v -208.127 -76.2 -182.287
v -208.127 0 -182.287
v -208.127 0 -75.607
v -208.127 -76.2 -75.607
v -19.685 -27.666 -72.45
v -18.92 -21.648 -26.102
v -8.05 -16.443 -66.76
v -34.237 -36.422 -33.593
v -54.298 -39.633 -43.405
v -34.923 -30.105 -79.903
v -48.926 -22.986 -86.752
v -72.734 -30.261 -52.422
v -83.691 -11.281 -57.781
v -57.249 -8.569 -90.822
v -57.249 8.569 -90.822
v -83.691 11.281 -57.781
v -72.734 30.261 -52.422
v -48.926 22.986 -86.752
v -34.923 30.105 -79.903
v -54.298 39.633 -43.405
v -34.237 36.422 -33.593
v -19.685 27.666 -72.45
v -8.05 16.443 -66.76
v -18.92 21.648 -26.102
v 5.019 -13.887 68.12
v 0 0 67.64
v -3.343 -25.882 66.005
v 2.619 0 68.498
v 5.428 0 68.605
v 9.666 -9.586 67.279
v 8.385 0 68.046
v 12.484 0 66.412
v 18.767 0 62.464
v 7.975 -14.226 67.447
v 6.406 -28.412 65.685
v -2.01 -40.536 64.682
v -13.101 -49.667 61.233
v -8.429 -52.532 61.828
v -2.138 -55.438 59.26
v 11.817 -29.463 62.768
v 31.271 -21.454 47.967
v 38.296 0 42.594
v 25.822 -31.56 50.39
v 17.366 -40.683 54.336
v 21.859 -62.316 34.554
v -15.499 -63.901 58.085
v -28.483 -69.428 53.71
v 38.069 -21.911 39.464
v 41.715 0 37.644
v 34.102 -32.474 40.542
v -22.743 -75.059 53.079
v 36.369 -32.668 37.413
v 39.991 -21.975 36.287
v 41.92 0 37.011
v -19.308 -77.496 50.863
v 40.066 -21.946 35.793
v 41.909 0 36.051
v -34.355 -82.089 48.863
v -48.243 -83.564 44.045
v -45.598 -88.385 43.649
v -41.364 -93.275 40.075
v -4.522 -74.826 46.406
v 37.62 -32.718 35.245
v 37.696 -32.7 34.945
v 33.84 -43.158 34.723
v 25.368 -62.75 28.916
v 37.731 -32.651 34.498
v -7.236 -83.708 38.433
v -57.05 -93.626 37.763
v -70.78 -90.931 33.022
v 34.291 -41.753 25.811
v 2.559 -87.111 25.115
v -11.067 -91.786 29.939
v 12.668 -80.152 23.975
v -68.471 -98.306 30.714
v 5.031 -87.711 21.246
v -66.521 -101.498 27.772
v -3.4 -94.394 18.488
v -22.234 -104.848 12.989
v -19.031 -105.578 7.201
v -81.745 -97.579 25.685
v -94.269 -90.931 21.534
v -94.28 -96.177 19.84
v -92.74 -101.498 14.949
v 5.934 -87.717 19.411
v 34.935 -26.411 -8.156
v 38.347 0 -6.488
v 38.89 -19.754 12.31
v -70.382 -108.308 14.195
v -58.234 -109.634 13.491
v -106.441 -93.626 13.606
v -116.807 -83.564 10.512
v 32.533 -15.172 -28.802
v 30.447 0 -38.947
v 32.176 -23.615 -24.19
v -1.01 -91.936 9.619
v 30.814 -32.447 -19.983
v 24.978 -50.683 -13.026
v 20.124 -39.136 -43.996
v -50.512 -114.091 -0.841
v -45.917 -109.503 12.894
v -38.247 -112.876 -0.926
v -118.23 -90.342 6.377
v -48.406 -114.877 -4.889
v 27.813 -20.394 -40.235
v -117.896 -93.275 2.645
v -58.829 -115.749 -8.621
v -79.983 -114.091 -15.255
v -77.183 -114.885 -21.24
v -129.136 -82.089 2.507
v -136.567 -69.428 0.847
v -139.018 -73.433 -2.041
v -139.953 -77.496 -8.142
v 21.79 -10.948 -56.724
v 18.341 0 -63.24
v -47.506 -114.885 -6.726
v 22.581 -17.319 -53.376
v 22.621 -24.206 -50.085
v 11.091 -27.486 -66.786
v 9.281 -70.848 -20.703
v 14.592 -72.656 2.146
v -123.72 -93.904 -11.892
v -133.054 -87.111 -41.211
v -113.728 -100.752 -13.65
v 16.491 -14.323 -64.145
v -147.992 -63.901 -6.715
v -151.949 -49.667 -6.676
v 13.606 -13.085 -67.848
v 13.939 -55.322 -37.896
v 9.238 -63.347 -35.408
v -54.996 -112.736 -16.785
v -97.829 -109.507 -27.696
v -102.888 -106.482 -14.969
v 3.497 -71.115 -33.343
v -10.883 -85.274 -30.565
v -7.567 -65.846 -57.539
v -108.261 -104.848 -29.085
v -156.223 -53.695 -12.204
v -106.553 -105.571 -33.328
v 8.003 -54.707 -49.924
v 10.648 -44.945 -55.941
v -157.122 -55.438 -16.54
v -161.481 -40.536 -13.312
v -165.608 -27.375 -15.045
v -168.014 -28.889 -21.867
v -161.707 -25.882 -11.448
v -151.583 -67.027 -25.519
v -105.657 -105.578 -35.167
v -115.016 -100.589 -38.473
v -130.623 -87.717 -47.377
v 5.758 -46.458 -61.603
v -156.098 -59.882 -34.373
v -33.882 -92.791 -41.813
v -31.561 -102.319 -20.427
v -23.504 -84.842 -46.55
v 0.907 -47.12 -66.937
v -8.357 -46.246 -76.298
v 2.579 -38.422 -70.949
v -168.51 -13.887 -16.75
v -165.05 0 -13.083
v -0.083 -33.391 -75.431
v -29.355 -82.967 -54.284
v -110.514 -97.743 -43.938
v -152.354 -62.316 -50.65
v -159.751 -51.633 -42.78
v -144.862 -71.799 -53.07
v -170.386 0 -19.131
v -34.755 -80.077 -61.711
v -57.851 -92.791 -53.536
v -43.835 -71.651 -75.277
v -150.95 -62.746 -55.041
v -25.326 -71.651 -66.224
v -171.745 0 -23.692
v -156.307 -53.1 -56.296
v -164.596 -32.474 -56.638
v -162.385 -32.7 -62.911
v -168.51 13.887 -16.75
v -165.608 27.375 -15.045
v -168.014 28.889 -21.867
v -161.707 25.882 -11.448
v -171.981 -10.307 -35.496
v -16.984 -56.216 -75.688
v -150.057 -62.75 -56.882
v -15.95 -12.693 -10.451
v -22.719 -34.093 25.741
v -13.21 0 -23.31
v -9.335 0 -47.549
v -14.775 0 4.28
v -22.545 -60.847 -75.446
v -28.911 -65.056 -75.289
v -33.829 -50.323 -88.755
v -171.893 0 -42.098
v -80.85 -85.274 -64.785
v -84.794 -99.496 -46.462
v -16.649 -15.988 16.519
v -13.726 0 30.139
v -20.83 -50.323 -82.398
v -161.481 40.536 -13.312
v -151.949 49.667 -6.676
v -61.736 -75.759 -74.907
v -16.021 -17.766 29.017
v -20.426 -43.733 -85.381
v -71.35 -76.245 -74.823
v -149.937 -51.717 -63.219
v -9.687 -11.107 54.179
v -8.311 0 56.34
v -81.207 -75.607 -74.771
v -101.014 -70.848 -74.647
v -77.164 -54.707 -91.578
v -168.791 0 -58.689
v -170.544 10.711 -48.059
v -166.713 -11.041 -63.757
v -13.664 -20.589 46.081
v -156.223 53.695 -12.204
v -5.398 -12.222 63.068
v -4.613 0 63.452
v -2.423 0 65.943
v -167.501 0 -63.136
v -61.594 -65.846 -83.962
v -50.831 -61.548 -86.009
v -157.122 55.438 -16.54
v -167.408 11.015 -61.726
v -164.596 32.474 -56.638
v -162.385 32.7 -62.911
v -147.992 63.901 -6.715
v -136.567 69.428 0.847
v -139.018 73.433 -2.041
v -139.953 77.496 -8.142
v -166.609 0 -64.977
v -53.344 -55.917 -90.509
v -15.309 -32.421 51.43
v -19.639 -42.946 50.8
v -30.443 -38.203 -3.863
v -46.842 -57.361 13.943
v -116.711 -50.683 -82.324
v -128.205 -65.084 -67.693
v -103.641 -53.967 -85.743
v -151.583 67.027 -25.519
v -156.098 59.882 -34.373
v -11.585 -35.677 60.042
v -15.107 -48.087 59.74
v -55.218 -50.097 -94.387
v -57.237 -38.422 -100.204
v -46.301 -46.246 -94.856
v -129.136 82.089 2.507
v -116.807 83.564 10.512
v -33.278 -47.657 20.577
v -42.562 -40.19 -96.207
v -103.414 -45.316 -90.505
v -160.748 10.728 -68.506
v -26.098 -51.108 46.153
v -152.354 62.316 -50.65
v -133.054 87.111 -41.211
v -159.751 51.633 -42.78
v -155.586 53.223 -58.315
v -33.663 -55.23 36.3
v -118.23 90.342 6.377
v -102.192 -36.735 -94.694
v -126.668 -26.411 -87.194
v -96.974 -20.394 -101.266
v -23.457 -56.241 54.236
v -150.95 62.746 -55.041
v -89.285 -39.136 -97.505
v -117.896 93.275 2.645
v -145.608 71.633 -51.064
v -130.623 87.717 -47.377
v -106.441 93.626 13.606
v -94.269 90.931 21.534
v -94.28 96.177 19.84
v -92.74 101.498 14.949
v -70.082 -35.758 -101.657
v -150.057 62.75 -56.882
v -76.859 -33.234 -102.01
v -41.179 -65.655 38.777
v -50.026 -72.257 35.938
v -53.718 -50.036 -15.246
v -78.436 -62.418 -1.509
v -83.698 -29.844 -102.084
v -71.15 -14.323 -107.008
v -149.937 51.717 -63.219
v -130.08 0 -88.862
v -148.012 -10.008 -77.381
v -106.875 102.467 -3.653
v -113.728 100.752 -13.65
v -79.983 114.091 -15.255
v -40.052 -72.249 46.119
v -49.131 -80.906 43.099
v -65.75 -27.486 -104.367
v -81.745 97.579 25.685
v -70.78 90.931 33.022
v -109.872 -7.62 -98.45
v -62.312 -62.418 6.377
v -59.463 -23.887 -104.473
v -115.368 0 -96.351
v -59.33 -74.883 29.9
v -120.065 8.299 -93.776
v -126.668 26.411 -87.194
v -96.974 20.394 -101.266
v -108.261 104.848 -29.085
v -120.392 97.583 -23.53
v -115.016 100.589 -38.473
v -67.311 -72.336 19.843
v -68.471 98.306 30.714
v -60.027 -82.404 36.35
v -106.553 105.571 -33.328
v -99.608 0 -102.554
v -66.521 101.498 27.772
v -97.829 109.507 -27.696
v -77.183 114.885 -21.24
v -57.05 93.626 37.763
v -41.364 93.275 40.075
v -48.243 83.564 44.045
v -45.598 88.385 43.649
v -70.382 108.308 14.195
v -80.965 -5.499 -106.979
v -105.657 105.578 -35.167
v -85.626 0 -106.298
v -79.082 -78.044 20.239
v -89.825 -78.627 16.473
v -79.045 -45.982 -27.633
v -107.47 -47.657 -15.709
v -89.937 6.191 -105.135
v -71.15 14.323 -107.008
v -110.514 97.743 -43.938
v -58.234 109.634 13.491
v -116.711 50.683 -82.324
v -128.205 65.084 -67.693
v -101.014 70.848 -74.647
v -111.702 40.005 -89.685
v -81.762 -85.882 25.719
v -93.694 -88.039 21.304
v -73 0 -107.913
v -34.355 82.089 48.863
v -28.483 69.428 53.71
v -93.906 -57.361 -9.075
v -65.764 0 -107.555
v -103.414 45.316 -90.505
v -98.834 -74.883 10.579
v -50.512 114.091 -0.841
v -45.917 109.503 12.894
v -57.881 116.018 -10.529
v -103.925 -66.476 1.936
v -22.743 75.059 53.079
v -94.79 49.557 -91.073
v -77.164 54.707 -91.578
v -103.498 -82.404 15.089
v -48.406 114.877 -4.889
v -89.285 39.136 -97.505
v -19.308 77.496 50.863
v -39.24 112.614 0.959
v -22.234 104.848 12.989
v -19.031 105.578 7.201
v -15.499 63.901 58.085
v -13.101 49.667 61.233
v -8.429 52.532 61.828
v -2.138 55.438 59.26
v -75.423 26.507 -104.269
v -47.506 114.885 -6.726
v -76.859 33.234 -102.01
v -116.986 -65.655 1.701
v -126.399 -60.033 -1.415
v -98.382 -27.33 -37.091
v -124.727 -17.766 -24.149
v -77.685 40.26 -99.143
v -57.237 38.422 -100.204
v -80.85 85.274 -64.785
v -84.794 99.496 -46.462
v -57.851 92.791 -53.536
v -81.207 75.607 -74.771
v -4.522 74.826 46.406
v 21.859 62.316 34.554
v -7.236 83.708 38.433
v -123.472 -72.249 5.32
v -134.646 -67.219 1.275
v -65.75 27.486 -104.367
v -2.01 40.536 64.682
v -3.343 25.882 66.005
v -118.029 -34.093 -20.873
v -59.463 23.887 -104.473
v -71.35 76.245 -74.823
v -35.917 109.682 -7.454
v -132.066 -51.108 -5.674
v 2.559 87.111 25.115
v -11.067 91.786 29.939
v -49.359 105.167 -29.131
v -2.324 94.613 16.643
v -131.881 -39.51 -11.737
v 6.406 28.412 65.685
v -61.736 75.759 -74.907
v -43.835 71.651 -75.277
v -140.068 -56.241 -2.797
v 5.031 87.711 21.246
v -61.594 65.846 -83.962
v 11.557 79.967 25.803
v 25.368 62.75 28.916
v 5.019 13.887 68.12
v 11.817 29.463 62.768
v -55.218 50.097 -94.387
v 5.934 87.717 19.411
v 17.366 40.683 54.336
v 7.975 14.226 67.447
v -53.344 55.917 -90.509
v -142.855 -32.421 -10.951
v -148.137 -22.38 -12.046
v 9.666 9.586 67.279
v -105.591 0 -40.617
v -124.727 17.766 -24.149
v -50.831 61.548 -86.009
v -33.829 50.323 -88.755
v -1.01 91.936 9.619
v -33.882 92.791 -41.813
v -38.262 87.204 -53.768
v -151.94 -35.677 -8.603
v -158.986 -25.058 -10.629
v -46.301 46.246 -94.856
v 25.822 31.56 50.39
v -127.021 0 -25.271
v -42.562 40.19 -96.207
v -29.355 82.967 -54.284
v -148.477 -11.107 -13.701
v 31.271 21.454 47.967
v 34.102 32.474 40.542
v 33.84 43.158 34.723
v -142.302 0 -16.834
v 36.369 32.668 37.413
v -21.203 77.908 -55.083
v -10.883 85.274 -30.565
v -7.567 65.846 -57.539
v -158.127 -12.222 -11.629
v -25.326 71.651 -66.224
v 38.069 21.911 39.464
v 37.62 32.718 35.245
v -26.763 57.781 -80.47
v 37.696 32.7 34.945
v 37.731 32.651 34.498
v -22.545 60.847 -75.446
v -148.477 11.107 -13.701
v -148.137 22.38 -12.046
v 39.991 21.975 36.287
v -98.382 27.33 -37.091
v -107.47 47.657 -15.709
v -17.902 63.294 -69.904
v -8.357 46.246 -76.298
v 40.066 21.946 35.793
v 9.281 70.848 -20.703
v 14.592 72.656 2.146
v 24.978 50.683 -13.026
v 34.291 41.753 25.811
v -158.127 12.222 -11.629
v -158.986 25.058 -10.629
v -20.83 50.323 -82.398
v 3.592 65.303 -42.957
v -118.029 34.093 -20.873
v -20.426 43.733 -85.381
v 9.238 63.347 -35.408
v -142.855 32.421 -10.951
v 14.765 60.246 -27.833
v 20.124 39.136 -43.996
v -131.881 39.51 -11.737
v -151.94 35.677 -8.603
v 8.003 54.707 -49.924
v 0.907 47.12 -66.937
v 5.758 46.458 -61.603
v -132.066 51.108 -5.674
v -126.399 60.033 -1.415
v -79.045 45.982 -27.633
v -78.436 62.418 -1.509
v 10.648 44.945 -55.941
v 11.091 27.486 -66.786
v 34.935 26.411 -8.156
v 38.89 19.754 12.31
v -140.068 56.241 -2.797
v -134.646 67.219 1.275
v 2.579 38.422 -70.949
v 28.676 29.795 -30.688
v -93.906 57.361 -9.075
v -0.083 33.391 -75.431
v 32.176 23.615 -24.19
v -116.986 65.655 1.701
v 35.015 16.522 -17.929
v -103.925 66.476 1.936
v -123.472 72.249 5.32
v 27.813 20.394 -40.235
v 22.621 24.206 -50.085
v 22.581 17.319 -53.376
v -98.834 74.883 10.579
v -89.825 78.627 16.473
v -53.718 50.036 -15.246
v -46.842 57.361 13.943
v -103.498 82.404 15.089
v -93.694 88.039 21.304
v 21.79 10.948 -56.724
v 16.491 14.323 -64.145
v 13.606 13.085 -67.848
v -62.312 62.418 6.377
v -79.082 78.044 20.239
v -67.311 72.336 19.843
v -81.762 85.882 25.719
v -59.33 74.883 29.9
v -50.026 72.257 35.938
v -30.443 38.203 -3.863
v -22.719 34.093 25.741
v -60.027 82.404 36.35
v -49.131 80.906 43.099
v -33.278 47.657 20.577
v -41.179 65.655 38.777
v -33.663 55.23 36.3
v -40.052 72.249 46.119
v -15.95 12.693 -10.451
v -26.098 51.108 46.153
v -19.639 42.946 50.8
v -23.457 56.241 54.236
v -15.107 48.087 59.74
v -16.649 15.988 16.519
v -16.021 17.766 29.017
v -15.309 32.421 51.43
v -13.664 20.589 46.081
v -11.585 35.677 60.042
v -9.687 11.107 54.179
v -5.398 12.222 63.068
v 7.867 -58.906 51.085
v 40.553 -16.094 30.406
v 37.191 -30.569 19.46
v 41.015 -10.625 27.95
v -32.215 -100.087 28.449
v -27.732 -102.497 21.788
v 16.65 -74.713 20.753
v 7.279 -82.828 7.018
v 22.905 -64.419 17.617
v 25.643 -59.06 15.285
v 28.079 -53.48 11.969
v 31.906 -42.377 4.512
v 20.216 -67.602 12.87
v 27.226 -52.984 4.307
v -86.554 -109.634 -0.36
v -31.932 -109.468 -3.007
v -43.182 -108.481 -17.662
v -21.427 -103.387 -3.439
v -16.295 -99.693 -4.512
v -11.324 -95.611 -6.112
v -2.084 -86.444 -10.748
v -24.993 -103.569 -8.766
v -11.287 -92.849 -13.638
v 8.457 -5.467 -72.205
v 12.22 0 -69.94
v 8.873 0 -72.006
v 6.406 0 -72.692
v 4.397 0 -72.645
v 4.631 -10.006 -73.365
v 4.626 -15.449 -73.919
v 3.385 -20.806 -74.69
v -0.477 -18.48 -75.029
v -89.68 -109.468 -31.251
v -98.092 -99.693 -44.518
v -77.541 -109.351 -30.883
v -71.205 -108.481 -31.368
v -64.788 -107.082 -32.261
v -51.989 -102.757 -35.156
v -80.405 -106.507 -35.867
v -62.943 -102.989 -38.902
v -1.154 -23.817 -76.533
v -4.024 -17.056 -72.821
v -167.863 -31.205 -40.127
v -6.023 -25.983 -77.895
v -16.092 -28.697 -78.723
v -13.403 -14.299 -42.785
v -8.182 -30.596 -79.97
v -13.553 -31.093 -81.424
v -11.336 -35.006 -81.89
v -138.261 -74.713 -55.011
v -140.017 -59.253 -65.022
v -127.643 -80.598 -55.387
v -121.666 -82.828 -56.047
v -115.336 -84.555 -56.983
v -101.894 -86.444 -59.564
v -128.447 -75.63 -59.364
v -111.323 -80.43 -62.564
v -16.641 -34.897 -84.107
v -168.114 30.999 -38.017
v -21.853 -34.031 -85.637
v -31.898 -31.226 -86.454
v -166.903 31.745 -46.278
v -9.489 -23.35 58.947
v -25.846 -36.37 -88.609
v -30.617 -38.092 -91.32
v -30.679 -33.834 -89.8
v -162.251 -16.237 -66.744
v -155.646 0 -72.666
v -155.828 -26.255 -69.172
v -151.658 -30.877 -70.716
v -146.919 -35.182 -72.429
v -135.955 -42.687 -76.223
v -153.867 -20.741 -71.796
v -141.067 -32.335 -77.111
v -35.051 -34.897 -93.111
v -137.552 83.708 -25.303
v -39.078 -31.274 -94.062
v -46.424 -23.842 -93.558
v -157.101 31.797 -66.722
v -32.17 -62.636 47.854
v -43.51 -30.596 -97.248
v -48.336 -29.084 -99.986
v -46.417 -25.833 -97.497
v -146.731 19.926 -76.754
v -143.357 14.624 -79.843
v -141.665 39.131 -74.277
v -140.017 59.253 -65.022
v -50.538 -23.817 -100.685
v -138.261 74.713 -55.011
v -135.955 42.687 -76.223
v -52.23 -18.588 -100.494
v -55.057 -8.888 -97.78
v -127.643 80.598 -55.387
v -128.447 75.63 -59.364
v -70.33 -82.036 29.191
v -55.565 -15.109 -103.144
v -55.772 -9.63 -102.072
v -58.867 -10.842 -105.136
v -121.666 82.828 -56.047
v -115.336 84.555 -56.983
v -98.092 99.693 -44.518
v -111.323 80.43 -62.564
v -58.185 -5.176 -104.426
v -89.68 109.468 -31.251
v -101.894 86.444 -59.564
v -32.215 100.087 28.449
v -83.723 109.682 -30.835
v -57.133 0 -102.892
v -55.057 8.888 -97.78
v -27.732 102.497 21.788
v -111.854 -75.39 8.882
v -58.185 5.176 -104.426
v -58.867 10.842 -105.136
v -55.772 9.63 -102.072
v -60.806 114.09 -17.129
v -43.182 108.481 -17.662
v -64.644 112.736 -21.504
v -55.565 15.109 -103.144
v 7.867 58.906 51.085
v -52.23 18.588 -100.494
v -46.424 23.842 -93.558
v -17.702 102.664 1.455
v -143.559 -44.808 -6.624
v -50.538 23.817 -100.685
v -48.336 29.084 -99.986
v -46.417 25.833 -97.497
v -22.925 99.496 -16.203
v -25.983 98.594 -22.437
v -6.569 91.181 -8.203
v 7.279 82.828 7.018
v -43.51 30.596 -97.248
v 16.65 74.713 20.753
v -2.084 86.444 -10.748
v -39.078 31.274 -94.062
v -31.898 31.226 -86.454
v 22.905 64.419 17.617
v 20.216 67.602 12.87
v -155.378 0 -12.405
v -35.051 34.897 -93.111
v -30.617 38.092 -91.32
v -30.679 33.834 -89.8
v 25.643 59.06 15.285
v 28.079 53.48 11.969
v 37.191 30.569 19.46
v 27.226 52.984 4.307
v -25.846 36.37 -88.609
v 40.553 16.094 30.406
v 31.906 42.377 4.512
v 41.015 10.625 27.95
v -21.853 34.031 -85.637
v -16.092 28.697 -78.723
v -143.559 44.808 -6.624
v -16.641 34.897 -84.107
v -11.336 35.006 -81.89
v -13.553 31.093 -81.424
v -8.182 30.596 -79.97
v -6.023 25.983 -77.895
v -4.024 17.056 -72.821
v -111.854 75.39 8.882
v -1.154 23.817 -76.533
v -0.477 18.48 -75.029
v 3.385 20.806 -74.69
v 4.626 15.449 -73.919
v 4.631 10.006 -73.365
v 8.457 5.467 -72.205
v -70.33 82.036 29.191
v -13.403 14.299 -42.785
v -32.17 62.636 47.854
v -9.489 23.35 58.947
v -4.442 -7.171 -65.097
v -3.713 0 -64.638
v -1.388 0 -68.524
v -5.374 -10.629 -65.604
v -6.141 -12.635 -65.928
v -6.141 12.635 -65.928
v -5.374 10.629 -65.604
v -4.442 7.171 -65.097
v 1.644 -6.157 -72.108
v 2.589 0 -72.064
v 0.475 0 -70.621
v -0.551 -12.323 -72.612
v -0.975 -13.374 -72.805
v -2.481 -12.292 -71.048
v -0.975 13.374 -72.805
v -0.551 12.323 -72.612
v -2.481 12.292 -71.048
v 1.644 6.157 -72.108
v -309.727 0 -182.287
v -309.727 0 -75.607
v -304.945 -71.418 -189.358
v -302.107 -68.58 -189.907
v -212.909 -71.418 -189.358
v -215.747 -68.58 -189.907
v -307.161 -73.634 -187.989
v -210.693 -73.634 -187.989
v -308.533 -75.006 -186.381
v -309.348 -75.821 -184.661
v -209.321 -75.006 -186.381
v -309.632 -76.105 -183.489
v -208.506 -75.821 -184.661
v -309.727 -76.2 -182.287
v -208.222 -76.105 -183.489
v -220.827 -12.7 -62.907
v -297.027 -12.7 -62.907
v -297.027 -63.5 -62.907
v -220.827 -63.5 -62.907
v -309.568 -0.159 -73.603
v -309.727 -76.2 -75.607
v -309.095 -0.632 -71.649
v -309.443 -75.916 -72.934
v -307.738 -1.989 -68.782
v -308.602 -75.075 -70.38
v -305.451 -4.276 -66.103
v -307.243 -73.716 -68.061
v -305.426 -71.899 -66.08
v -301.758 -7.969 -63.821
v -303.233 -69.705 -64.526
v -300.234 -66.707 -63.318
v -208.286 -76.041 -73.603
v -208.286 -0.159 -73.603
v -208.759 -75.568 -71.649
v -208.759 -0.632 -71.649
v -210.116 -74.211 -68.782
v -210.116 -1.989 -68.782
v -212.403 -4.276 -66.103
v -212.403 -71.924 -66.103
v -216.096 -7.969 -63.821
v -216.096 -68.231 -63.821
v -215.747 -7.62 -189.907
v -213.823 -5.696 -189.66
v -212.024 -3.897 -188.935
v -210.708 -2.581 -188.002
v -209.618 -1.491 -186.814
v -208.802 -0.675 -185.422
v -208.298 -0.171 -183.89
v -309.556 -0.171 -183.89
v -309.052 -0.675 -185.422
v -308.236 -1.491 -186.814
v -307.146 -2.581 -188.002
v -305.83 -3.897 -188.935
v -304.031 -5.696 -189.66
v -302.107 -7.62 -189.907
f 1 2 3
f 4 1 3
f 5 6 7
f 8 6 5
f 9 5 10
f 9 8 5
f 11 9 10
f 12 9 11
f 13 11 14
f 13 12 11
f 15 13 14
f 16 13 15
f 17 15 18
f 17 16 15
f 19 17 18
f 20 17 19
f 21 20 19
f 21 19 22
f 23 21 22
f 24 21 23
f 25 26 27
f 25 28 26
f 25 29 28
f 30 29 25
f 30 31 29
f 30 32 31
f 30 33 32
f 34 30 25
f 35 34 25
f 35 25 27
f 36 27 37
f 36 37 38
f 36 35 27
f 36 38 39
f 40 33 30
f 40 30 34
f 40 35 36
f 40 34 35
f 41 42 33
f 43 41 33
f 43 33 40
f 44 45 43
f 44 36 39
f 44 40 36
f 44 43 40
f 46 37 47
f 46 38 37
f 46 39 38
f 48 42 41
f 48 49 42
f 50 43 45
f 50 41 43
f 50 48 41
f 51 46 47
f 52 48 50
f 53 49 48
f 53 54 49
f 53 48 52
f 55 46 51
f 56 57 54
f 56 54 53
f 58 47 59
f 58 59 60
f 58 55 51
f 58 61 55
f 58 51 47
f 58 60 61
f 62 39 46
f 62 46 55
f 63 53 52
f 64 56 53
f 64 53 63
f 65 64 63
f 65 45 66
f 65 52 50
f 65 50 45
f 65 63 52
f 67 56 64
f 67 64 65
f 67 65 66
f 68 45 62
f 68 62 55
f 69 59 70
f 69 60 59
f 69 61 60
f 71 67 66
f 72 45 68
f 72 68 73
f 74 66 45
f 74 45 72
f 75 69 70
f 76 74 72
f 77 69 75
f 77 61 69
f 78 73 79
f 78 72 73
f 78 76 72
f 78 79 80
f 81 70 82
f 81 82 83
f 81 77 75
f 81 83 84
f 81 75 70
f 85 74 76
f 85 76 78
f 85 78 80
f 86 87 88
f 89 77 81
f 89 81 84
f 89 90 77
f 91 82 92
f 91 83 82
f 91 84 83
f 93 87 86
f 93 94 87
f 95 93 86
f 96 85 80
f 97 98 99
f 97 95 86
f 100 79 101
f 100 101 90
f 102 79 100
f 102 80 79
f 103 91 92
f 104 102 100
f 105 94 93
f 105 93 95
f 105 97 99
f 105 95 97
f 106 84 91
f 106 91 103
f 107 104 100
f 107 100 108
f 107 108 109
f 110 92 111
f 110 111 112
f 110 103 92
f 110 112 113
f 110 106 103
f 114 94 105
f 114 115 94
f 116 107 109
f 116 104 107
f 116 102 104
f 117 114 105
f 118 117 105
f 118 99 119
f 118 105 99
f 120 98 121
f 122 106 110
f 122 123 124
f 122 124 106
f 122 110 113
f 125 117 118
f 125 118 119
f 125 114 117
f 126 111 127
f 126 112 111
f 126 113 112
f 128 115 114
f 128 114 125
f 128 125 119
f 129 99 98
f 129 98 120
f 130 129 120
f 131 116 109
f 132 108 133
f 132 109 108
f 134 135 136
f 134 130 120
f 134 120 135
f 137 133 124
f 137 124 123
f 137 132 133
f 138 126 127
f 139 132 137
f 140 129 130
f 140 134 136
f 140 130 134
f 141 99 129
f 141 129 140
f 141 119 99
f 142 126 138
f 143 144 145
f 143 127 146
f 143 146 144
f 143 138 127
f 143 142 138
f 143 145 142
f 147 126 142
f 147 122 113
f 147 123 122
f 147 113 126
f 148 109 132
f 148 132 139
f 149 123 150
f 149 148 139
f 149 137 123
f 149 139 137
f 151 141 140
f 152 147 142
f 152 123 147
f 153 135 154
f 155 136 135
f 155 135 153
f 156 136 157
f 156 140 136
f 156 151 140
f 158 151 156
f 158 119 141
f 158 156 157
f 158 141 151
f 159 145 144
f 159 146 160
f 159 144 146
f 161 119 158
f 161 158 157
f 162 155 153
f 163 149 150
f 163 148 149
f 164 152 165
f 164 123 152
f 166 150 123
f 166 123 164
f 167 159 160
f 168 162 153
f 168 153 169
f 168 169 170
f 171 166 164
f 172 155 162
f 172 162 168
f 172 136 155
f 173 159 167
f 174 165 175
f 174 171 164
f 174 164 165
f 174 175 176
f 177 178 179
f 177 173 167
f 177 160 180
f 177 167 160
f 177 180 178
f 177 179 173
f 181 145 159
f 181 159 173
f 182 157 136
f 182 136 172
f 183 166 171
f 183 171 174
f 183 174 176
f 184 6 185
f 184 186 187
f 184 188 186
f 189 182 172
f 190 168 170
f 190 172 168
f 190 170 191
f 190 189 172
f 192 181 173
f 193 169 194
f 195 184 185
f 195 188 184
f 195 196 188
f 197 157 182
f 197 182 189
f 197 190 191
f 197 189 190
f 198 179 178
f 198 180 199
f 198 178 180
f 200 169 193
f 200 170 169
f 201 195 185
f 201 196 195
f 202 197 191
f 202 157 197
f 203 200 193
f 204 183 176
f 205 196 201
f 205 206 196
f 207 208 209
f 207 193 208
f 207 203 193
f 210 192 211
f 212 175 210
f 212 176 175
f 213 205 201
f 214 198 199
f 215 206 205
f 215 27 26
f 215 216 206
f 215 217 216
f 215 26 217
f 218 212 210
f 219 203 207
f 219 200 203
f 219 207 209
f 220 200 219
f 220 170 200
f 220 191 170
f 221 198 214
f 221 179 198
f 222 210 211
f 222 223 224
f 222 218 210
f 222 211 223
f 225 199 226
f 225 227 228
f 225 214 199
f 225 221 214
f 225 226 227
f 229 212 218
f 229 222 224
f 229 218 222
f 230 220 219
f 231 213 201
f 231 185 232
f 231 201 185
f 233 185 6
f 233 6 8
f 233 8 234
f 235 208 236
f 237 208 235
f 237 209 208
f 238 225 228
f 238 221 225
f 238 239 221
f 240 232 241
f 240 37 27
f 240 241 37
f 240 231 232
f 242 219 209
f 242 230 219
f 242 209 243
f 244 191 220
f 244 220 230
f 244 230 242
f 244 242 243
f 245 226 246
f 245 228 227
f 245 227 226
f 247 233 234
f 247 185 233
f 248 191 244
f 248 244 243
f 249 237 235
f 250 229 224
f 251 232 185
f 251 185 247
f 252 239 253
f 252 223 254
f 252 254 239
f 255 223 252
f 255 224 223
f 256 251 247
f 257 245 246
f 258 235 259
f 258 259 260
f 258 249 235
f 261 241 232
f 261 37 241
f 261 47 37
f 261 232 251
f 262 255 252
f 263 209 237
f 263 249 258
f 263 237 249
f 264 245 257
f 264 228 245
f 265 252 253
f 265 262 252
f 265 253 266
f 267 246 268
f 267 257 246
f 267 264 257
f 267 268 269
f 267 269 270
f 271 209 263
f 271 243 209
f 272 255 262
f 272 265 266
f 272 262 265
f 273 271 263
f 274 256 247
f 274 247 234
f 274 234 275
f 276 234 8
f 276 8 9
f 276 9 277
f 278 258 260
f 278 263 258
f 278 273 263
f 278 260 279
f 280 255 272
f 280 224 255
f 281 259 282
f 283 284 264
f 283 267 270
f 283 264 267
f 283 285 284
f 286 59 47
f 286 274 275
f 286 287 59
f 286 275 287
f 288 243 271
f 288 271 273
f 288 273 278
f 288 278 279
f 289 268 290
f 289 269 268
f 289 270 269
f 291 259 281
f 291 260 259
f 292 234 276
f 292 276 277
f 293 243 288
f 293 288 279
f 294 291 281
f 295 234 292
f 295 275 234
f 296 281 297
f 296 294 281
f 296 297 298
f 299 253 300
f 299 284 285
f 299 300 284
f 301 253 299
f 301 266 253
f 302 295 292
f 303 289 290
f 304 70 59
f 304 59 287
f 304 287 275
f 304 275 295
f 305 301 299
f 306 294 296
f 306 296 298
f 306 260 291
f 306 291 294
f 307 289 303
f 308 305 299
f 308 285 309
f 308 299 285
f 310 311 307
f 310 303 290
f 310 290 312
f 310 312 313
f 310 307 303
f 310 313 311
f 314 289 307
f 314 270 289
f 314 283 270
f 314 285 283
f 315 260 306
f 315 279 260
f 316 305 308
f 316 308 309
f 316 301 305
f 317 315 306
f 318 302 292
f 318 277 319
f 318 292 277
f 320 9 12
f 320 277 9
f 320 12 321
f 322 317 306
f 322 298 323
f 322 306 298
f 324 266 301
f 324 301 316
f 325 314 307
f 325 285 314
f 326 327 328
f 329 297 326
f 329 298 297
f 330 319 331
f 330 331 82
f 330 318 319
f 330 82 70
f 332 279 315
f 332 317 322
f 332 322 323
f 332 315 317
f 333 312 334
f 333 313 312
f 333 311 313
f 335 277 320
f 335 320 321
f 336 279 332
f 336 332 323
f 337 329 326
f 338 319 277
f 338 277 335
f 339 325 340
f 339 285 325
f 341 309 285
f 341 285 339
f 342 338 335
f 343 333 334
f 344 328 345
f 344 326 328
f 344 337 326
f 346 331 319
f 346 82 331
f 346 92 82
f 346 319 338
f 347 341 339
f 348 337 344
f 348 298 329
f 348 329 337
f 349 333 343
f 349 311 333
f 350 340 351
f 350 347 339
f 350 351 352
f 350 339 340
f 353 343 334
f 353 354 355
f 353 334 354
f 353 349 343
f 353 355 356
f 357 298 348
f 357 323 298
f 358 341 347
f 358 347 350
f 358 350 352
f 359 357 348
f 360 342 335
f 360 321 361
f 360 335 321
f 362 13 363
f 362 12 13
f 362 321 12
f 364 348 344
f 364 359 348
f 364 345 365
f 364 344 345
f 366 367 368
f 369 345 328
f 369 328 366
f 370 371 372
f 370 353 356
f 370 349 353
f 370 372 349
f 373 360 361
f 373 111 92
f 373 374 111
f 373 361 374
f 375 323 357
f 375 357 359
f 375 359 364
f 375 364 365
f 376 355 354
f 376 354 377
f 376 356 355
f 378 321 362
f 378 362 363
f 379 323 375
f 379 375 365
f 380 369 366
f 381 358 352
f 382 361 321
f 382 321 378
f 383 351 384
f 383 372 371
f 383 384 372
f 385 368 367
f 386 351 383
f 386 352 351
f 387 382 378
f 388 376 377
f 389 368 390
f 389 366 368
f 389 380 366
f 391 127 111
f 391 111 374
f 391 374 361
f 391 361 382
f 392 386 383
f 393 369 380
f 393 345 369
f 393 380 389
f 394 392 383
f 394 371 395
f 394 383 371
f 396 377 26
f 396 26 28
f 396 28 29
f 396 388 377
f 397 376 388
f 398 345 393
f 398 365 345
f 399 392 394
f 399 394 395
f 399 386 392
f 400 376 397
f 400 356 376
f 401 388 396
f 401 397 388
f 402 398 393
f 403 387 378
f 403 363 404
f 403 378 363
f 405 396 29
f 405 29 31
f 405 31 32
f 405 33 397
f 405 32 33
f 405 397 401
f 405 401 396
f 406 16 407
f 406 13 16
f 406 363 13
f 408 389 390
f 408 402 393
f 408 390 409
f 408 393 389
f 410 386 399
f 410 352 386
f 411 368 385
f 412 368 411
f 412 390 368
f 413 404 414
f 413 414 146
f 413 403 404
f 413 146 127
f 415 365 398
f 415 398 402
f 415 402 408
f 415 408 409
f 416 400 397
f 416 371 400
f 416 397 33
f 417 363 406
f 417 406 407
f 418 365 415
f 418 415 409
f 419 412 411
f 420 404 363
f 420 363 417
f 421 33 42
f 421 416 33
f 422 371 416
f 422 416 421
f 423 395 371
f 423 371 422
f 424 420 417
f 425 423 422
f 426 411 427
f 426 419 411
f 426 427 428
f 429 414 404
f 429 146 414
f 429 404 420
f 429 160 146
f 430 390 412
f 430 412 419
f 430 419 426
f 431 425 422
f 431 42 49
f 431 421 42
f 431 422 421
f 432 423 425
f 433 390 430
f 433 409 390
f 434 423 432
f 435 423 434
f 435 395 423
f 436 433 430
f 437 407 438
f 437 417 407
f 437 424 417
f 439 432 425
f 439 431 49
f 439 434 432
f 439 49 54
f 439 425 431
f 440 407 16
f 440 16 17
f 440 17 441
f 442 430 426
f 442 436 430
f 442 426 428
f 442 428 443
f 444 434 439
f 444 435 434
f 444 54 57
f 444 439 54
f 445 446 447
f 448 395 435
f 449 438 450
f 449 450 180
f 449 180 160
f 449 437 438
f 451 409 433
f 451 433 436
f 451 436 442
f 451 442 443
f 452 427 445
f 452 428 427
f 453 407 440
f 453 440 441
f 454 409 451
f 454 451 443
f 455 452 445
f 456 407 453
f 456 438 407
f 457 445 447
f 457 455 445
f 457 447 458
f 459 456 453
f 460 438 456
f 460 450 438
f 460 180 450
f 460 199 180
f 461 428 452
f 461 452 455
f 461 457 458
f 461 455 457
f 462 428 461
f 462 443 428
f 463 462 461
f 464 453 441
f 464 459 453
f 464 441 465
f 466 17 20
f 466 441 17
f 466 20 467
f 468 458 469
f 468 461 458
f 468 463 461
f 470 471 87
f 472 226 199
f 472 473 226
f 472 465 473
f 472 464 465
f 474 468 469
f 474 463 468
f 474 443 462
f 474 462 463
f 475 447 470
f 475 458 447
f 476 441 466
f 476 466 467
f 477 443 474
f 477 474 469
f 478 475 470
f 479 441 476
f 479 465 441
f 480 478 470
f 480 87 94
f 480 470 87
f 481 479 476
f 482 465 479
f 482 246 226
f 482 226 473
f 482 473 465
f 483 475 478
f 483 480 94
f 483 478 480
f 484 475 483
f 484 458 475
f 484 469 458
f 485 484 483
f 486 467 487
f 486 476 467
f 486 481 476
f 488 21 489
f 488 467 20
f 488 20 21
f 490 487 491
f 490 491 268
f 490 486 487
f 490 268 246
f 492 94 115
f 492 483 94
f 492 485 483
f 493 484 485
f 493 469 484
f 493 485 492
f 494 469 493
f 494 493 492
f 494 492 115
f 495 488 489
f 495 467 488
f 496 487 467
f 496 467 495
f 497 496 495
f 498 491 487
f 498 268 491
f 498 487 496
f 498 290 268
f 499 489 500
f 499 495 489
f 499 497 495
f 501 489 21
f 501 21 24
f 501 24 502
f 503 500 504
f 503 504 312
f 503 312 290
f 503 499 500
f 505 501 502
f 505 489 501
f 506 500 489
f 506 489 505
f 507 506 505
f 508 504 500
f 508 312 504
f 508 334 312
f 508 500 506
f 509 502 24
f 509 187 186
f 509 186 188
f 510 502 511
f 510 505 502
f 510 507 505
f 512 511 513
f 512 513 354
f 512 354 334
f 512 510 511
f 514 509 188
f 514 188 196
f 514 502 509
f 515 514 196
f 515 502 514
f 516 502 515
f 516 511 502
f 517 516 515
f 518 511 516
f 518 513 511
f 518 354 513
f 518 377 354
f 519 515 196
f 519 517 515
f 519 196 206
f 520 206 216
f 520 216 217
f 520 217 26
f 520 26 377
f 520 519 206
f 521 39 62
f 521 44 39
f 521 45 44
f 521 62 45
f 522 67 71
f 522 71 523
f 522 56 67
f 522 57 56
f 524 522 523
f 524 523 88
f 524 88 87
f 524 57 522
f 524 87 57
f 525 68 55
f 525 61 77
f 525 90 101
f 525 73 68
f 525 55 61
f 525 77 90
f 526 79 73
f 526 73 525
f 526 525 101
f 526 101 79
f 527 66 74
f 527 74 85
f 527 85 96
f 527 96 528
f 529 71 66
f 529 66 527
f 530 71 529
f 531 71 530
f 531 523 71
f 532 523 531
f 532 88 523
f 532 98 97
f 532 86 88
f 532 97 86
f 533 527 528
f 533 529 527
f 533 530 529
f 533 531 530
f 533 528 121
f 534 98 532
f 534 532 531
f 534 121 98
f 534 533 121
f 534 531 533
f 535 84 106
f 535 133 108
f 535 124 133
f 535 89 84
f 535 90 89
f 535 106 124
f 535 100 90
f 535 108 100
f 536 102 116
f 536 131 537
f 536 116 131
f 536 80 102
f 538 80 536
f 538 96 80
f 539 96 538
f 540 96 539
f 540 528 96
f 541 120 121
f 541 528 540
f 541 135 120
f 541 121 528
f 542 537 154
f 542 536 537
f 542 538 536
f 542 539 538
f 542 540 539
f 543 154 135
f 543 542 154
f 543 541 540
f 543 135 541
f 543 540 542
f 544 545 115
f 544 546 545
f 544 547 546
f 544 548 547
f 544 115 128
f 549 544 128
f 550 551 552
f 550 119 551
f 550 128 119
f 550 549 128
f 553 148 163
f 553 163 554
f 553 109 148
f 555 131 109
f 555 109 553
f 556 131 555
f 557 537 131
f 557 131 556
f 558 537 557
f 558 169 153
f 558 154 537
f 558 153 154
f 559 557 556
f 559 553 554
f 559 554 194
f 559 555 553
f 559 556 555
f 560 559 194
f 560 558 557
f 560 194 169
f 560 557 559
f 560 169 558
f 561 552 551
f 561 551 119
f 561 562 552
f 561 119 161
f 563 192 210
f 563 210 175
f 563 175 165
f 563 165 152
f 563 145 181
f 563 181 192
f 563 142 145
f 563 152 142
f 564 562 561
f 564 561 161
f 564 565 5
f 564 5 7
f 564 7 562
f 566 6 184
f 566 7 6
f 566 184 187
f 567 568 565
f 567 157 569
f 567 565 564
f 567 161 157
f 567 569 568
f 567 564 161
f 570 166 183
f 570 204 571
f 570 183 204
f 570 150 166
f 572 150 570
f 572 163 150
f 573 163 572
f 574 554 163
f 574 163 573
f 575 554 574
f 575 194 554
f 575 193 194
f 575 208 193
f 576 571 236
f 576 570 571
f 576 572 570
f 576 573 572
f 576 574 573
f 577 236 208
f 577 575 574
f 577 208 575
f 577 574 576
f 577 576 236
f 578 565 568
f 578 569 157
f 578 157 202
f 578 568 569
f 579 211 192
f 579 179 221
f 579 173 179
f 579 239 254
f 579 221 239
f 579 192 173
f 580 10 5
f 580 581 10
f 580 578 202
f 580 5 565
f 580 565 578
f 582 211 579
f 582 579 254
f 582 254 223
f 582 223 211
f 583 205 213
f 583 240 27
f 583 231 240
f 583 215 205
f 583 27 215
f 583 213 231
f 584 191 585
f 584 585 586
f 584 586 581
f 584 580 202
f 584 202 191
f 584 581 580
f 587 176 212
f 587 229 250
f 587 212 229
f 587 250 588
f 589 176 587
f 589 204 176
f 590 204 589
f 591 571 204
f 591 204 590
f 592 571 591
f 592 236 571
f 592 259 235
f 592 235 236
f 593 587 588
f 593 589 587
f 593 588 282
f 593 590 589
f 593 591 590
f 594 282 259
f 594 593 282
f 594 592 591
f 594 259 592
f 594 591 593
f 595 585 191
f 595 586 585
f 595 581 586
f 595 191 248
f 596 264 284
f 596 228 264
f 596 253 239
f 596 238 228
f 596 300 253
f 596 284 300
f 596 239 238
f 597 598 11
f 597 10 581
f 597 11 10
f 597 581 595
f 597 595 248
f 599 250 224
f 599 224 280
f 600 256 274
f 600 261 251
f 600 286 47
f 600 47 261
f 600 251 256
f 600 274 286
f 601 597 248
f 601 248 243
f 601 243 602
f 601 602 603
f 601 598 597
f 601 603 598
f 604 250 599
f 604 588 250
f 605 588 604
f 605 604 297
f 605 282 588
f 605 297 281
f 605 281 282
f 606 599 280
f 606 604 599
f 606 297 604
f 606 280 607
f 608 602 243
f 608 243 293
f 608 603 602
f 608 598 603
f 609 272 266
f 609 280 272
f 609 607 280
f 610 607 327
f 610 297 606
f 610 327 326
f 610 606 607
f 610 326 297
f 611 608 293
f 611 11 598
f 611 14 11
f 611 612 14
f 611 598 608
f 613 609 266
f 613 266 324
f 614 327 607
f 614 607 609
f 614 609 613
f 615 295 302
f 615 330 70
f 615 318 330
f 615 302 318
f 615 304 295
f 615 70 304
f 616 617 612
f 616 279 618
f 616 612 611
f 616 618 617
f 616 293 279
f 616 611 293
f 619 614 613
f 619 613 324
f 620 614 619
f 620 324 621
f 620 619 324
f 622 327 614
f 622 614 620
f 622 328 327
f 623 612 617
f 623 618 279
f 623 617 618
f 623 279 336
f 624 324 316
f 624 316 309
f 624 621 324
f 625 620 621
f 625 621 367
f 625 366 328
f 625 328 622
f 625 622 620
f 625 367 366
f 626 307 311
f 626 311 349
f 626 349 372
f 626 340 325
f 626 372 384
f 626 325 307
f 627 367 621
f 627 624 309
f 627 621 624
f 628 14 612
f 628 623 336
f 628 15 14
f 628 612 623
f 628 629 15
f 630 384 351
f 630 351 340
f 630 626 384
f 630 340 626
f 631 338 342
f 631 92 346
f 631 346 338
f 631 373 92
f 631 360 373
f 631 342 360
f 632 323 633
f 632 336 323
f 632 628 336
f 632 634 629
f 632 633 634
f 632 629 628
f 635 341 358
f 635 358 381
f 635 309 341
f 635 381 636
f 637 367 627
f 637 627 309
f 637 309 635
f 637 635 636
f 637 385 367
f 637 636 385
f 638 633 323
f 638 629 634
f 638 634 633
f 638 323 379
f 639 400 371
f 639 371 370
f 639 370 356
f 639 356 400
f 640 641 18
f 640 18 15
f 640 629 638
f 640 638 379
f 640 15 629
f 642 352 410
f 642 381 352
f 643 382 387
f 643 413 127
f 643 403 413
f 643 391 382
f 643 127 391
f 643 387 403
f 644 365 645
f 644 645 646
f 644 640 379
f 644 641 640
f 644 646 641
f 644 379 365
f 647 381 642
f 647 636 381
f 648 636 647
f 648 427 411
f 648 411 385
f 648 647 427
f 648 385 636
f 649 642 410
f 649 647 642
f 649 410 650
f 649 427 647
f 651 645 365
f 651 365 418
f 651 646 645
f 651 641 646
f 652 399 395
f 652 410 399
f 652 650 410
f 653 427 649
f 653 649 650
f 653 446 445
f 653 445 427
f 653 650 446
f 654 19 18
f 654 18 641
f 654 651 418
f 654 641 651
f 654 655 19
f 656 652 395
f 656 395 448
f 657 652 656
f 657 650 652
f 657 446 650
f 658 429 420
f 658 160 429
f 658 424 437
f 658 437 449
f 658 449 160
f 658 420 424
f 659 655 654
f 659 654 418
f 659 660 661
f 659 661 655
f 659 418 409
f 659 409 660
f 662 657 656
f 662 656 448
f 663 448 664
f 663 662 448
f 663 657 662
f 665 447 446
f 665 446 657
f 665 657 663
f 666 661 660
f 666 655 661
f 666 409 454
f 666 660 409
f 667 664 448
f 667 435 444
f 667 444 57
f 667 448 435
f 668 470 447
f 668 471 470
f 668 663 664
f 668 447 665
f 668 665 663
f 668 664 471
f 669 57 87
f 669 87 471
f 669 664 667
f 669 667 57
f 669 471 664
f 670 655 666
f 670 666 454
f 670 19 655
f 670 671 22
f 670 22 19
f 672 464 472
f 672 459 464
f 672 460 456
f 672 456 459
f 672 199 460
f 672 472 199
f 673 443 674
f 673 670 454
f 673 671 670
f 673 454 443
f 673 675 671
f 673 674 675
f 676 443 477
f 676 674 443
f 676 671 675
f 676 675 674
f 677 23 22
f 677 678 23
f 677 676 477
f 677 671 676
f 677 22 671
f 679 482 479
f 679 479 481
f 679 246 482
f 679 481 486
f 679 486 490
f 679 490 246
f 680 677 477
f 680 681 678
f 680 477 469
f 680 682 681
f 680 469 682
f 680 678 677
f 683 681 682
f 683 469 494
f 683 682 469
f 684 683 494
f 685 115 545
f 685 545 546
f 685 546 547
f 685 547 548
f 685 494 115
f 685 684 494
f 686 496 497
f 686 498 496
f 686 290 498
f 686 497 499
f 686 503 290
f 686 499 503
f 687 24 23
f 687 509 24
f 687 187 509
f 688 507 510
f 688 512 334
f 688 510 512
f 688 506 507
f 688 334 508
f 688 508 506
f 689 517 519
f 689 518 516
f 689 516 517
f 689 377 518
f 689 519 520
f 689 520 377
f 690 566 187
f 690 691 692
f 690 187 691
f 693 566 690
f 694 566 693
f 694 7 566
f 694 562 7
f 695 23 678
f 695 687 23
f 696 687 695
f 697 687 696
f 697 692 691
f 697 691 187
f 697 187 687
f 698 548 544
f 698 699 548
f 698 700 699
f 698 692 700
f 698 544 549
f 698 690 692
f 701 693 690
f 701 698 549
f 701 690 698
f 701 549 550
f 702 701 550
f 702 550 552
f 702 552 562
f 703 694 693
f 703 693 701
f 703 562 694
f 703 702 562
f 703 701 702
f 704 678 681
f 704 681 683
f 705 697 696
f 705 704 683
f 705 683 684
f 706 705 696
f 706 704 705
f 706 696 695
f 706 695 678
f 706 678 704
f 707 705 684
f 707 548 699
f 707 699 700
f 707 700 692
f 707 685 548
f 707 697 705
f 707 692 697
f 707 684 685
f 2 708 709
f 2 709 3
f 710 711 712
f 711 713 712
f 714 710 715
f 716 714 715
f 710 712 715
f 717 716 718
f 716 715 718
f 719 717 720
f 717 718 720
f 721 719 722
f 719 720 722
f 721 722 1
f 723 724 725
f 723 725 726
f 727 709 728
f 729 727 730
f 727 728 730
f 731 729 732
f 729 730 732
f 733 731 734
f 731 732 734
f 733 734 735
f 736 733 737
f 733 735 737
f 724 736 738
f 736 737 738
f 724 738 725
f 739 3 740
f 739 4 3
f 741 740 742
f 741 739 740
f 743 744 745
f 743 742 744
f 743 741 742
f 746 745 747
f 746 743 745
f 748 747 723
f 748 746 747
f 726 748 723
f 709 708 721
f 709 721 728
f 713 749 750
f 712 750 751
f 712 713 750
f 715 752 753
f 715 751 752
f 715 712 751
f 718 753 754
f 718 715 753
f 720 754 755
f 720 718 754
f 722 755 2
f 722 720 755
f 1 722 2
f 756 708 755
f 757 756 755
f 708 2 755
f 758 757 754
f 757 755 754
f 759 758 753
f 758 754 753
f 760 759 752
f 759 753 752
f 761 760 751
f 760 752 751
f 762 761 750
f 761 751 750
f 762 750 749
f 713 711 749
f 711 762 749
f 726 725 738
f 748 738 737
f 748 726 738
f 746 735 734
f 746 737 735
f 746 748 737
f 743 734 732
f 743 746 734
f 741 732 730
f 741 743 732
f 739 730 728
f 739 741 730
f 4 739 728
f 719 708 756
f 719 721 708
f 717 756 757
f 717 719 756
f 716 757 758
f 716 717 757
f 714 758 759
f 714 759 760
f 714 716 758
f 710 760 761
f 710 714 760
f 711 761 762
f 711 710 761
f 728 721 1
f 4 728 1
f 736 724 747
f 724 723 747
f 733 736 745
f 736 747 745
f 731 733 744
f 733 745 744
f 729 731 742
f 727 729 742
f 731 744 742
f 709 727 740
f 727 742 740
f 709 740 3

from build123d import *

# Parameters (mm, degrees)
F0_W     = 101.6
F0_H     = 127
F2_DEPTH = 76.2
F3_R     = 12.7
F4_R     = 7.62


# Not quite as in the source:
# - a feature names something its author has since deleted; it is built from what else it names


with BuildPart() as f1:
    # F0 (on Front) → F1 (revolve)
    with BuildSketch(Plane.XZ):
        with BuildLine():
            add(Edge.make_bspline(
                [(0, 67.6398426294), (13.3935718053, 74.3762328832), (42.8956839394, 37.7354229944), (41.1346471608, 36.1149227712), (41.7408109301, -31.509032611), (-14.011665596, -117.9732392774), (-22.2011812589, 56.4736038375), (0, 67.6398426294)],
                knots=[0, 0, 0, 0, 0.1966106986, 0.2485014456, 0.4799841226, 0.6740981553, 1, 1, 1, 1], degree=3))
        make_face()
    revolve(axis=Axis((-91.6760973632, 0, 45.9895678796), (0.4393510153, 0, -0.898315471)))


with BuildPart() as f2:
    # F0 (on Front) → F2 (new body)
    with BuildSketch(Plane.XZ):
        with Locations((-258.9270345211, -126.4065781832)):
            Rectangle(F0_W, F0_H)
    extrude(amount=F2_DEPTH)

    # F3
    f3_edges = [f2.edges().sort_by_distance(p)[0] for p in [
        (-258.927035, 0, -62.906578),
        (-309.727035, -38.1, -62.906578),
        (-258.927035, -76.2, -62.906578),
        (-208.127035, -38.1, -62.906578),
    ]]
    fillet(f3_edges, radius=F3_R)

    # F4
    f4_edges = [f2.edges().sort_by_distance(p)[0] for p in [
        (-258.927035, -76.2, -189.906578),
        (-309.727035, -38.1, -189.906578),
        (-258.927035, 0, -189.906578),
        (-208.127035, -38.1, -189.906578),
    ]]
    fillet(f4_edges, radius=F4_R)


solid = Compound([f1.part, f2.part])
